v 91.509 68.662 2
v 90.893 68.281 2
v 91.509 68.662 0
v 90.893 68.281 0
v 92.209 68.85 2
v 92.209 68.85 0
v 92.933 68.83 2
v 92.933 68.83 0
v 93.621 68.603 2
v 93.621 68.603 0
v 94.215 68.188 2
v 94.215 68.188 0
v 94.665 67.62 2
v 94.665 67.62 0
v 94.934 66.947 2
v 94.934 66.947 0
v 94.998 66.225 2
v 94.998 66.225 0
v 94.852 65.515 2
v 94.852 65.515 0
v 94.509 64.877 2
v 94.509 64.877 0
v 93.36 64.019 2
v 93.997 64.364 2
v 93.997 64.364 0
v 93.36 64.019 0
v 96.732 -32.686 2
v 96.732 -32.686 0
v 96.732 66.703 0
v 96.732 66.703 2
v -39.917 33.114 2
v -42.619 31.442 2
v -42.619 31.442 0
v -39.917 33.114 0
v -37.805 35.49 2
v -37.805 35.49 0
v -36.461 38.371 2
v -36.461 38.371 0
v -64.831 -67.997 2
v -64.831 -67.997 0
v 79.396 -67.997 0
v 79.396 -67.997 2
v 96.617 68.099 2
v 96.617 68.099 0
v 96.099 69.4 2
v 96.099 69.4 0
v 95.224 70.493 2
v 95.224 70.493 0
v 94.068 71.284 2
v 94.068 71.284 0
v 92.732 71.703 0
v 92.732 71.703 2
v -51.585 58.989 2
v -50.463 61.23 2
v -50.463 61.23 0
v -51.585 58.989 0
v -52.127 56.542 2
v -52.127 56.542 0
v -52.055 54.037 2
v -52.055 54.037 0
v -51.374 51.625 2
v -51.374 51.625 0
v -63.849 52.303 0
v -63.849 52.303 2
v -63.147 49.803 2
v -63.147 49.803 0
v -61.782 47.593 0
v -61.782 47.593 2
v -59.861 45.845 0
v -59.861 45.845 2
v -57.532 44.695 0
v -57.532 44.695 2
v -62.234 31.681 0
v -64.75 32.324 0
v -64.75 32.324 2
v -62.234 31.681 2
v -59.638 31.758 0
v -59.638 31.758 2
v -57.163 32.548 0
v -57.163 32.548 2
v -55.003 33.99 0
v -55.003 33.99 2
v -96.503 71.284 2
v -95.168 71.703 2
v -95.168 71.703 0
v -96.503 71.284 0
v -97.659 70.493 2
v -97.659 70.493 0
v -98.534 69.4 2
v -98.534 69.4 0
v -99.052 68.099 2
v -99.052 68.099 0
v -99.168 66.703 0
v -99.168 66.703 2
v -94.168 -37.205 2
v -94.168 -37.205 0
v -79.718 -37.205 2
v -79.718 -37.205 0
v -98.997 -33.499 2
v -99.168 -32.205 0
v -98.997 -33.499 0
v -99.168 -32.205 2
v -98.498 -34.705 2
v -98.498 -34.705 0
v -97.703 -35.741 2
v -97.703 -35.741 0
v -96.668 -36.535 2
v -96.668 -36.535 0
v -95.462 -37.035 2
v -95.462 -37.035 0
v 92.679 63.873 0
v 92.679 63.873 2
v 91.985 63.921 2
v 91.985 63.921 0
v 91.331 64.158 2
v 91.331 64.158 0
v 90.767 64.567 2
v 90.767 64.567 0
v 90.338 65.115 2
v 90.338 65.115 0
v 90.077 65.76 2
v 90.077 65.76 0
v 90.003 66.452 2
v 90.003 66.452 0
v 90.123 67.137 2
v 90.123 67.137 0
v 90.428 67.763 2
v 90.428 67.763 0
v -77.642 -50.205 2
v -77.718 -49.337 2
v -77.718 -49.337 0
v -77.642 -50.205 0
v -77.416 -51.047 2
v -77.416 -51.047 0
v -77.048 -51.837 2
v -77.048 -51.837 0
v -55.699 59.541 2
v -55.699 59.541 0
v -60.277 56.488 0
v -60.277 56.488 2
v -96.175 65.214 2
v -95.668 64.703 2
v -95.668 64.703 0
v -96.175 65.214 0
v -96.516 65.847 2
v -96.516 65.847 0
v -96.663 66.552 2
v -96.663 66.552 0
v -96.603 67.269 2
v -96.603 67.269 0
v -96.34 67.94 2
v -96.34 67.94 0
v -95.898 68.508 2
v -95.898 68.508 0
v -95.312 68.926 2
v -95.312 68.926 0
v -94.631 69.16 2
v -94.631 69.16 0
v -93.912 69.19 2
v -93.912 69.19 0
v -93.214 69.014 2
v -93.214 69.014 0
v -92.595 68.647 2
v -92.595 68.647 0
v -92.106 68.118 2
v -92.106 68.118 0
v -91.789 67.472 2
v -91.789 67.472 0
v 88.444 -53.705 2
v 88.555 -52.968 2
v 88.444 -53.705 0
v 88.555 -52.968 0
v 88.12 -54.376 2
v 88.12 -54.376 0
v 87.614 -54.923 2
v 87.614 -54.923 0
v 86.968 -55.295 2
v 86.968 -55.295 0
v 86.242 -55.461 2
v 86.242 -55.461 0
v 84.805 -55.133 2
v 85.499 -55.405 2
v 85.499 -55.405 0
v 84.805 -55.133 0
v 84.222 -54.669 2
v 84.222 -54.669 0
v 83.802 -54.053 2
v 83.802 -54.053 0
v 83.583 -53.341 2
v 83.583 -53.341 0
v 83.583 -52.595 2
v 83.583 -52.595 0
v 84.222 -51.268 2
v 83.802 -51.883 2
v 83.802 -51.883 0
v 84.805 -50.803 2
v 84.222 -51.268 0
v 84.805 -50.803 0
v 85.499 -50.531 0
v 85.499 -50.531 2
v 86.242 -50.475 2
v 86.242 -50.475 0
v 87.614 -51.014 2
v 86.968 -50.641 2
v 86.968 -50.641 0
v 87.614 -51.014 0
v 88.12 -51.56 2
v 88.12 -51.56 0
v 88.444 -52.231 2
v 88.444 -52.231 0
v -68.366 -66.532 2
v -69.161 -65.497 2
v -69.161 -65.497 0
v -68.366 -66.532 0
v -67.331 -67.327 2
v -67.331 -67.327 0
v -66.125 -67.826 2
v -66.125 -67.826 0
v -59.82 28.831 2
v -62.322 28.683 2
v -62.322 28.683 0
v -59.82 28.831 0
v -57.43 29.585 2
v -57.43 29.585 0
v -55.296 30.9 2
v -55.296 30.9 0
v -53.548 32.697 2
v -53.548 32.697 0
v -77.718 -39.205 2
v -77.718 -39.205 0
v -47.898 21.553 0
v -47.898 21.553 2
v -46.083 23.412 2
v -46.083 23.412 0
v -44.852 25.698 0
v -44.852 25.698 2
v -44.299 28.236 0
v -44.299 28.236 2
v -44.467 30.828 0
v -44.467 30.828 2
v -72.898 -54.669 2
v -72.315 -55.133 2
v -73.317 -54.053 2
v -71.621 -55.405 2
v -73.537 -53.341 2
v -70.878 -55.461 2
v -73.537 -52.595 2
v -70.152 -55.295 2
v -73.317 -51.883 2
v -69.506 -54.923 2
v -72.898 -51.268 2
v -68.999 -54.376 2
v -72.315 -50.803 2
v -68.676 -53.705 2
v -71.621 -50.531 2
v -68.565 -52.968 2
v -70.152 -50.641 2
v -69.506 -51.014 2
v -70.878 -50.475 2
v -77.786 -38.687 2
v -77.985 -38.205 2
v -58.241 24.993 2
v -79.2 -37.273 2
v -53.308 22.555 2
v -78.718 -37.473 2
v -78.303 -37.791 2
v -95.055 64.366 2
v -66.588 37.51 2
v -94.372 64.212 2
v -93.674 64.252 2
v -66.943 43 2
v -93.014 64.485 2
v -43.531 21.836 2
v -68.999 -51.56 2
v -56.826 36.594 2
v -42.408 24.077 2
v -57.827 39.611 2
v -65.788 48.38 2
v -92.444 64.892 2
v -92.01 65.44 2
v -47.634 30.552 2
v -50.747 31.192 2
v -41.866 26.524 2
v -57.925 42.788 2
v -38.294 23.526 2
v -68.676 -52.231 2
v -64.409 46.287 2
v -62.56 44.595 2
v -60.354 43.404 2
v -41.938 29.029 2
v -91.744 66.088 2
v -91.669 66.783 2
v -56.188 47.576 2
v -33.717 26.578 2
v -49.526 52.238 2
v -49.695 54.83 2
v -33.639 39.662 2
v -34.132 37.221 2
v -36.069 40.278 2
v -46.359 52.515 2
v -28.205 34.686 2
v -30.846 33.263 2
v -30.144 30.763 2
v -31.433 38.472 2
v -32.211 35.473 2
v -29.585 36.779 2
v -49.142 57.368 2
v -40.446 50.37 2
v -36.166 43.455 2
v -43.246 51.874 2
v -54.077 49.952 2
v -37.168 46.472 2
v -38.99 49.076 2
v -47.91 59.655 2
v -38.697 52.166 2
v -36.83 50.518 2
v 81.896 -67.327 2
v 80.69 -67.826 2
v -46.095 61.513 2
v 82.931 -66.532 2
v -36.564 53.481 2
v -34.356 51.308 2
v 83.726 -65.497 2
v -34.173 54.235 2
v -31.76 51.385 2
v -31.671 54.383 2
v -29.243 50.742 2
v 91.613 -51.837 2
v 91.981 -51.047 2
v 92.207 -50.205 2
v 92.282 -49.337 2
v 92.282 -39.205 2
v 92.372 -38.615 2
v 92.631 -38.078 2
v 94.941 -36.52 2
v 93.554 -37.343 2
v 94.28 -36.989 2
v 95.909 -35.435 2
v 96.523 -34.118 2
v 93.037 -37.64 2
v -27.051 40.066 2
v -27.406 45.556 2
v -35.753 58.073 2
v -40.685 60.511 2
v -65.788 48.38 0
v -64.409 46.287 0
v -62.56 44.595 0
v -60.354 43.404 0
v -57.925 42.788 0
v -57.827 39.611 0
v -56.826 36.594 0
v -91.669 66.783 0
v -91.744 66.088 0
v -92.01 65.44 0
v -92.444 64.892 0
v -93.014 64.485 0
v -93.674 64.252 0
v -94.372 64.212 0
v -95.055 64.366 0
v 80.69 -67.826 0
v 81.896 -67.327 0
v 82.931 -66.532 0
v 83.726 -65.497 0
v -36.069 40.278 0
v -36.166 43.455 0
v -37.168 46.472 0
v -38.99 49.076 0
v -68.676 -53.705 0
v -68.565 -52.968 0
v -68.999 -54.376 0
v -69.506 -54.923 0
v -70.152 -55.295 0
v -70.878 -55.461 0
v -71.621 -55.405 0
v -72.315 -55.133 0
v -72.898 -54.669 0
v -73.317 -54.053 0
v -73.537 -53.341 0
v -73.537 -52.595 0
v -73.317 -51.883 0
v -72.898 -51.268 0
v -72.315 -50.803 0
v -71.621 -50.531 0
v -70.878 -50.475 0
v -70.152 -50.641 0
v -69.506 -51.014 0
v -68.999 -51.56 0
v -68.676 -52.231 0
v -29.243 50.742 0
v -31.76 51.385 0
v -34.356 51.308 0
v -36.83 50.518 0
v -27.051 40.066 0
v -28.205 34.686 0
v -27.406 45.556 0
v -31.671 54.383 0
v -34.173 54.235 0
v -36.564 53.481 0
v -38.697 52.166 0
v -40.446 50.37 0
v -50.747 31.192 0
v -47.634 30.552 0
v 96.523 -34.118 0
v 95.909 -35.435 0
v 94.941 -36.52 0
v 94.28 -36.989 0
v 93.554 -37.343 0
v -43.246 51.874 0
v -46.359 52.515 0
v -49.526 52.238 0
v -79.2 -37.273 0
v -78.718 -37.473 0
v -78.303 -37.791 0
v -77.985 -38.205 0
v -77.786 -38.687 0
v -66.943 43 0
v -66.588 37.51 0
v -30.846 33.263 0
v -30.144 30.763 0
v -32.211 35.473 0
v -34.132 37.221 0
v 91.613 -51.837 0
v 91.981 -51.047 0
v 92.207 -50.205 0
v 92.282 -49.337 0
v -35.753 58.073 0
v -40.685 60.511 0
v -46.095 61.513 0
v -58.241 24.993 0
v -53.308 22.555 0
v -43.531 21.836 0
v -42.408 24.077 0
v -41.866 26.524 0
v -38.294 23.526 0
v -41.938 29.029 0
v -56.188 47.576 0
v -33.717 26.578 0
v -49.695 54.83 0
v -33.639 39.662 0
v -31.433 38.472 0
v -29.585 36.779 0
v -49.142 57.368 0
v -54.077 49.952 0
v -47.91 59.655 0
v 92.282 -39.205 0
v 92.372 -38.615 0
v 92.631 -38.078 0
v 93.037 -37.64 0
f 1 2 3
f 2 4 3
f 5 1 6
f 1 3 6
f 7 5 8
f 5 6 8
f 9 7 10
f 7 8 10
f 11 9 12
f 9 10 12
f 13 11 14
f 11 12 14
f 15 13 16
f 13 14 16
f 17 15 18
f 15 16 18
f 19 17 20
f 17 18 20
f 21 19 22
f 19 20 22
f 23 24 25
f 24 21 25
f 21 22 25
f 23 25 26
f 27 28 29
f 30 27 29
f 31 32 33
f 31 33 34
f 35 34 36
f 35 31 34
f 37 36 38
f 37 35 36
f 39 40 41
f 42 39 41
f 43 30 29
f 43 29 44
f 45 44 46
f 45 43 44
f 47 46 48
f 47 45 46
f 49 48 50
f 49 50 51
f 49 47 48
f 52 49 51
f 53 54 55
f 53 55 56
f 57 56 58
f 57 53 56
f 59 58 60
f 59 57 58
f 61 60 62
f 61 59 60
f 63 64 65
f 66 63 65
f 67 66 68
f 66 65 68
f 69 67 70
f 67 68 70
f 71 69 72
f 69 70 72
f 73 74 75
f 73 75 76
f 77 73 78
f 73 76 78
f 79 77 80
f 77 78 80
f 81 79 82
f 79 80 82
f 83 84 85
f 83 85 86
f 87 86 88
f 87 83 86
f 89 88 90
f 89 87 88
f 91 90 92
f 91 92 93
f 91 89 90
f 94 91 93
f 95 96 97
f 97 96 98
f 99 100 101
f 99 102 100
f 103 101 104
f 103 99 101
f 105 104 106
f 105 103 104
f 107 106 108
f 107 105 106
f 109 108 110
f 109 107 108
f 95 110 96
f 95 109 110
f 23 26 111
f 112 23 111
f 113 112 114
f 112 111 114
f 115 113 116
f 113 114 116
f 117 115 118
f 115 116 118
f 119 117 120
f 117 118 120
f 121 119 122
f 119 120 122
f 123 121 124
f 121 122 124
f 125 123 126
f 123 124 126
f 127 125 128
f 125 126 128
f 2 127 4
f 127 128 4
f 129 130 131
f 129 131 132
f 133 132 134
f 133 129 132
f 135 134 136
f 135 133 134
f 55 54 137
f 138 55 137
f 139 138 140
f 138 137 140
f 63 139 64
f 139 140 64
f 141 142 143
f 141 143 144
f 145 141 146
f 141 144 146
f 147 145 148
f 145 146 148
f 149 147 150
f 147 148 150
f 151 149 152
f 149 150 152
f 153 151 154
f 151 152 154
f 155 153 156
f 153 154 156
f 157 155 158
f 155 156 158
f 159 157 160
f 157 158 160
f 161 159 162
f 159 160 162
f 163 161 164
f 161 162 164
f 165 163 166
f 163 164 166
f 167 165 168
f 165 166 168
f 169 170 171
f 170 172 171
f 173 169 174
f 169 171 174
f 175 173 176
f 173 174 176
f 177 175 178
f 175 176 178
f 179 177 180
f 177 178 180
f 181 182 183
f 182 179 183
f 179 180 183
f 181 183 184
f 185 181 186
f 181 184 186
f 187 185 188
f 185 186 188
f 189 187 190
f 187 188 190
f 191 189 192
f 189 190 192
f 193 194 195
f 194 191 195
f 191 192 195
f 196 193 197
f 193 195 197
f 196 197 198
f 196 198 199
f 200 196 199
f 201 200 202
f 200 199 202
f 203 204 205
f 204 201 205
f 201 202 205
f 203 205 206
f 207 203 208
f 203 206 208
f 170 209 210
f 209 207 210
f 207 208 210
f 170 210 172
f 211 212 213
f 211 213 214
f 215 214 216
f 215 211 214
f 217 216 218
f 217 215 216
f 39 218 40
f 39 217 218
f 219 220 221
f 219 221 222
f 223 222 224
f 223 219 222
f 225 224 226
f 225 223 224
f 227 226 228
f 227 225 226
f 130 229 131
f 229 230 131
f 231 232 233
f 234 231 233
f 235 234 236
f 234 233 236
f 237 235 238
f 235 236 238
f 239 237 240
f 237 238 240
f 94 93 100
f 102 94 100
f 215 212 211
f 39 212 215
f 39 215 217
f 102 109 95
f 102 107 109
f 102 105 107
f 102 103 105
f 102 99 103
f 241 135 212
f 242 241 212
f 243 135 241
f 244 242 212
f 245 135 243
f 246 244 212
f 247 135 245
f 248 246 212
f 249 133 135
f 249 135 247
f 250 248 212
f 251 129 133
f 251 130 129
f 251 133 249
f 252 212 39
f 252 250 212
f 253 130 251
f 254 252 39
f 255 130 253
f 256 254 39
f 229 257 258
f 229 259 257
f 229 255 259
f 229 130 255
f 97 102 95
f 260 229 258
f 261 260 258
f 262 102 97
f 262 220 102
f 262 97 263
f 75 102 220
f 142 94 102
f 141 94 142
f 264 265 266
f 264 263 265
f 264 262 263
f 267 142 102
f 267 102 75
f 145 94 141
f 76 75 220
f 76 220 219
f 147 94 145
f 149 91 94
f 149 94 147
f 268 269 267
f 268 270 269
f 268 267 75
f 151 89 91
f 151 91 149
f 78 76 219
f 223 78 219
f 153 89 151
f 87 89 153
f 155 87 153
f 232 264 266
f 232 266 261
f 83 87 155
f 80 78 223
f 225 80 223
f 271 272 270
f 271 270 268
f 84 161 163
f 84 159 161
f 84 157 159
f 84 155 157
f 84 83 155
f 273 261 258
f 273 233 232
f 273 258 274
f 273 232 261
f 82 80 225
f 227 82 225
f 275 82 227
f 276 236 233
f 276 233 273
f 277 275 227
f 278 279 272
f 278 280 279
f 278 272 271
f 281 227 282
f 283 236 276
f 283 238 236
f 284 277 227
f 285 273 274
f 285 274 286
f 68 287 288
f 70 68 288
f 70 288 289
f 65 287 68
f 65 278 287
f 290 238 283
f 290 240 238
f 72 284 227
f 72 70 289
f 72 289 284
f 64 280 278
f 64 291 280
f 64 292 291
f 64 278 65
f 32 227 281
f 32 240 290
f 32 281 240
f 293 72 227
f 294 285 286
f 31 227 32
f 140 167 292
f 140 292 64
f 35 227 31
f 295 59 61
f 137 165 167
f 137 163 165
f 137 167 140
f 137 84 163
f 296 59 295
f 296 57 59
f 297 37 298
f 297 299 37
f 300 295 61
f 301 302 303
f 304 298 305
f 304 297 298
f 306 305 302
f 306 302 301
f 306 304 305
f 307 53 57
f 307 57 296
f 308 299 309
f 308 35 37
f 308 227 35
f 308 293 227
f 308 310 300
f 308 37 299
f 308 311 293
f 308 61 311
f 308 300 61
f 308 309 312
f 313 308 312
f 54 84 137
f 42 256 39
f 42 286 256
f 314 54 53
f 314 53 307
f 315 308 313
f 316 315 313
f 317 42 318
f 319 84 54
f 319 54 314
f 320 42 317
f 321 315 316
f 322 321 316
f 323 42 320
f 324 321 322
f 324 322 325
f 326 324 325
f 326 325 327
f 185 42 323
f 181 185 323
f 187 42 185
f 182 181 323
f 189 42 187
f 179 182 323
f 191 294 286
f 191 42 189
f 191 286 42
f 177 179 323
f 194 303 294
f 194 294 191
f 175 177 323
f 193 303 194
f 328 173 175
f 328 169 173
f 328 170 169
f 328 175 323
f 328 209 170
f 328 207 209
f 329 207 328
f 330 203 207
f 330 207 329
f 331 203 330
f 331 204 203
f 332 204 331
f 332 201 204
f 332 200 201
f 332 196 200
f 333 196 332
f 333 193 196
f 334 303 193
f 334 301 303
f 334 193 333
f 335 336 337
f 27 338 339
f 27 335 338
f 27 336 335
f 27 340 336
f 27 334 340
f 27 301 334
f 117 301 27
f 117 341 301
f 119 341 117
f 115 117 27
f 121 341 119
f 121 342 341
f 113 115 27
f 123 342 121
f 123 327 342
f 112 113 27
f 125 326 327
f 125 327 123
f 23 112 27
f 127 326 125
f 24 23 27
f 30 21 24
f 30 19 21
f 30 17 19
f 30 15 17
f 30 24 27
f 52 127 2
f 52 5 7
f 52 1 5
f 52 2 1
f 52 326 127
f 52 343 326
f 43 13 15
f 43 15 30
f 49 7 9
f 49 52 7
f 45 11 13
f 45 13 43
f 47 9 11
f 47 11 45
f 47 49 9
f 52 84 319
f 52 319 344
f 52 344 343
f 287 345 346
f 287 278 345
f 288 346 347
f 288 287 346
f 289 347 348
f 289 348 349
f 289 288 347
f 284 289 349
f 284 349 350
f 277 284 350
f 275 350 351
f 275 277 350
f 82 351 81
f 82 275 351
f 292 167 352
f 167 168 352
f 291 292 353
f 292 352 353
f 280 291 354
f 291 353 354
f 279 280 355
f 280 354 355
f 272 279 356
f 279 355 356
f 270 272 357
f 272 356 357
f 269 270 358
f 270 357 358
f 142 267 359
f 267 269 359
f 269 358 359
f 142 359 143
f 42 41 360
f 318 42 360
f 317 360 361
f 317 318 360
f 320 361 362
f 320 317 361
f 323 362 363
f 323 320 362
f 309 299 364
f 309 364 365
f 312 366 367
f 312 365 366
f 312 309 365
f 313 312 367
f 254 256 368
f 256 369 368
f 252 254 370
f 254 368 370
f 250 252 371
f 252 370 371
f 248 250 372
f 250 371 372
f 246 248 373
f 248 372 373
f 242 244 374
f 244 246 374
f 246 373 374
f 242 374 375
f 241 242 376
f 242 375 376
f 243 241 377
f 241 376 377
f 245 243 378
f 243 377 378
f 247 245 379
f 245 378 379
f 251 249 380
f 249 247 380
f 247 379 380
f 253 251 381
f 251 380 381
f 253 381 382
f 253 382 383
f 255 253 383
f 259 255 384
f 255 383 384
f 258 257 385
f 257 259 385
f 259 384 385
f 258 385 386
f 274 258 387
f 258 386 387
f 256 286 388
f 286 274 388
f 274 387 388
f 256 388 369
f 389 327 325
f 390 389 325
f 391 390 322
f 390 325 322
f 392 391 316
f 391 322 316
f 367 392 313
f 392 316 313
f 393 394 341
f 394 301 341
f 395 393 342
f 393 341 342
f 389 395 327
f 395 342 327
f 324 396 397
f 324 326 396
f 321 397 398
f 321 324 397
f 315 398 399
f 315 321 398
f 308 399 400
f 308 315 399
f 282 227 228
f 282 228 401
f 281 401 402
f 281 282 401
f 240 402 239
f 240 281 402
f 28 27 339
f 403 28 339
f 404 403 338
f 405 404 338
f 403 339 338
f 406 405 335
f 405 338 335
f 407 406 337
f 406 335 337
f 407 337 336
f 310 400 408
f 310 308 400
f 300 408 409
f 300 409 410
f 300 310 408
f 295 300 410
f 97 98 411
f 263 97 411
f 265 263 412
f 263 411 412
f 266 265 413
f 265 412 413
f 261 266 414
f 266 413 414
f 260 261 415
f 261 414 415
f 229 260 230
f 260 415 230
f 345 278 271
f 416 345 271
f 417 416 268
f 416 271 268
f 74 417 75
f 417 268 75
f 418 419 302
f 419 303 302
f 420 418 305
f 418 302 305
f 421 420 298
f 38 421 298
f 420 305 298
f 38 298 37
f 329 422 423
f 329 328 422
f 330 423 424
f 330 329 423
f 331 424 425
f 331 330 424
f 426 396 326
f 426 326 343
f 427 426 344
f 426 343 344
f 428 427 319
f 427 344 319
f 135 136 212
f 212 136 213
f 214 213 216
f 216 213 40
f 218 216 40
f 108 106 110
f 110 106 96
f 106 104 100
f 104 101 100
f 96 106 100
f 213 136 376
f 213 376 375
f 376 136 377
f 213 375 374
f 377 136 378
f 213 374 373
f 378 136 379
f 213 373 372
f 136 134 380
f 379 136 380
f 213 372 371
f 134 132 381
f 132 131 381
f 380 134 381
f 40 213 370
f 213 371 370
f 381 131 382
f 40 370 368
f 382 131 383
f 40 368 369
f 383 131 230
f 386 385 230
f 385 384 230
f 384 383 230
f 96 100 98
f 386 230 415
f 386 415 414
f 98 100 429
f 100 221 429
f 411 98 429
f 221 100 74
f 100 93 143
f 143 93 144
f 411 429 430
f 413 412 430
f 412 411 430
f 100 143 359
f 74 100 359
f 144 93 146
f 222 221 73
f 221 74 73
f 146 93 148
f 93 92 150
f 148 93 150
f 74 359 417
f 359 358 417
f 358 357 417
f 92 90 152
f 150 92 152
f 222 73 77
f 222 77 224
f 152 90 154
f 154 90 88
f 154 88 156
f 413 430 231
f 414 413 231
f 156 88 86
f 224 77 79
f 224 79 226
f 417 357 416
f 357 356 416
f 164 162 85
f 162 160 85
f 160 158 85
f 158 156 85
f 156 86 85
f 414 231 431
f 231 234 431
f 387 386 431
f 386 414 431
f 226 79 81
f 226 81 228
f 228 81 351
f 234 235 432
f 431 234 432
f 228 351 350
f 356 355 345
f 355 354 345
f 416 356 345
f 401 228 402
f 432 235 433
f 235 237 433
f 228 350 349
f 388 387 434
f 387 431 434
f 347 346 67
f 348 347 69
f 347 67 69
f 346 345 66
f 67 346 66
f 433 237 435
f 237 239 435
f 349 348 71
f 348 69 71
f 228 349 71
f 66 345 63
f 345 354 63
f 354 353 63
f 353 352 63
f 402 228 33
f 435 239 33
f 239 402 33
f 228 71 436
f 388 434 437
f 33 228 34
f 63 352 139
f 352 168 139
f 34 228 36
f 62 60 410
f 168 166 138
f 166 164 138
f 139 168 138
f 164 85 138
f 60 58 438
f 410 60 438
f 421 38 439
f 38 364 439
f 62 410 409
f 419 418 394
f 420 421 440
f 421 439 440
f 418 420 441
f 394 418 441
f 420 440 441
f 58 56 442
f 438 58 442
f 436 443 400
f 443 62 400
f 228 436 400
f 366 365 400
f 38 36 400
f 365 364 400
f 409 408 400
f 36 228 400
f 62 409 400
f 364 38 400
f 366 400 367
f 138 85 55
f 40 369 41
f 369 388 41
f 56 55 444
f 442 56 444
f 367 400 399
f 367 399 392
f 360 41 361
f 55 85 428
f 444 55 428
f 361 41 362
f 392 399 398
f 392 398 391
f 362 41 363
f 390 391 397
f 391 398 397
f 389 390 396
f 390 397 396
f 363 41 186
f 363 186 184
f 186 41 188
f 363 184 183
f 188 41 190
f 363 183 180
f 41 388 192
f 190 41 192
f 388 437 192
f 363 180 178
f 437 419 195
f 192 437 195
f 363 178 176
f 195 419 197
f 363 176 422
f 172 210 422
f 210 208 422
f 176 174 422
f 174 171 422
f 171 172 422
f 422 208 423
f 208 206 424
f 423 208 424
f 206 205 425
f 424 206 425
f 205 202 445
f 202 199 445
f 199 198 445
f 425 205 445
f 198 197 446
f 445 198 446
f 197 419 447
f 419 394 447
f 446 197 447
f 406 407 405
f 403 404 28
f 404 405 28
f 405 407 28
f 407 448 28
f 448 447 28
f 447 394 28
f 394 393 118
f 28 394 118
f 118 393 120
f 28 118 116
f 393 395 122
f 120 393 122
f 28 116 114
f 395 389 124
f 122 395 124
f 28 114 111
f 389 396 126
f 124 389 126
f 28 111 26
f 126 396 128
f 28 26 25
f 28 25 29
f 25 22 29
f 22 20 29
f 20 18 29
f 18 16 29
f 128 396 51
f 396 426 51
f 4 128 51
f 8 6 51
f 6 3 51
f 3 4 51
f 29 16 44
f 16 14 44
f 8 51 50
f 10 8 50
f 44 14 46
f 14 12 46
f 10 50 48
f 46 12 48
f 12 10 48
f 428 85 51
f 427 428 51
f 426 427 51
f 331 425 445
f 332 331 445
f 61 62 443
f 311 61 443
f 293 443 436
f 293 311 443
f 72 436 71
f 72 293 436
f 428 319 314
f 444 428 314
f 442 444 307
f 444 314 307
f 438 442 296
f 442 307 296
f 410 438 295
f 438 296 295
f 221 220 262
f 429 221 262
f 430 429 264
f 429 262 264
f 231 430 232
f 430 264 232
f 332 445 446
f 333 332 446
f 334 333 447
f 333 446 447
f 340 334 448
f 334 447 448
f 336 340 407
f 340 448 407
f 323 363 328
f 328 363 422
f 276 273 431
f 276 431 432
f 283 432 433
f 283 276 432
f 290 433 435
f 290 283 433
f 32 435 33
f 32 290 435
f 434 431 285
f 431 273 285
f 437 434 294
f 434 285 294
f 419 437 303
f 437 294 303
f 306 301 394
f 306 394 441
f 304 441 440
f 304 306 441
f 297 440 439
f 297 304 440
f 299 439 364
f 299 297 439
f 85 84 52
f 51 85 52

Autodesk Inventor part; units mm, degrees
ref_plane "YZ Plane" through (0, 0, 0) normal (1, 0, 0) x (0, 1, 0)
ref_plane "XZ Plane" through (0, 0, 0) normal (0, 1, 0) x (-1, 0, 0)
ref_plane "XY Plane" through (0, 0, 0) normal (0, 0, 1) x (1, 0, 0)
sketch "Sketch4" plane through (0, 0, 0) normal (0, 0, 1) x (1, 0, 0)
  line L0 (92.7325, 70.7032) -> (-95.1675, 70.7032) projected
  arc A0 (-95.1675, 70.7032) -> (-99.1675, 66.7032) centre (-95.1675, 66.7032) ccw projected
  line L1 (-99.1675, 66.7032) -> (-99.1675, -37.2051) projected
  arc A1 (-91.7887, 67.4724) -> (-95.6675, 64.7032) centre (-94.1675, 66.7032) ccw projected
  line L2 (-99.1675, -37.2051) -> (-79.7175, -37.2051) projected
  arc A2 (-77.7175, -39.2051) -> (-79.7175, -37.2051) centre (-79.7175, -39.2051) ccw projected
  line L3 (-77.7175, -39.2051) -> (-77.7175, -50.6763) projected
  line L4 (-77.7175, -50.6763) -> (-67.7175, -67.9968) projected
  line L5 (-67.7175, -67.9968) -> (82.2825, -67.9968) projected
  circle A3 centre (-71.0649, -52.9681) radius 2.5 projected
  line L6 (82.2825, -67.9968) -> (92.2825, -50.6763) projected
  circle A4 centre (86.0549, -52.9681) radius 2.5 projected
  line L7 (92.2825, -50.6763) -> (92.2825, -39.2051) projected
  arc A5 (94.2825, -37.2051) -> (92.2825, -39.2051) centre (94.2825, -39.2051) ccw projected
  line L8 (94.2825, -37.2051) -> (96.7325, -37.2051) projected
  line L9 (96.7325, -37.2051) -> (96.7325, 66.7032) projected
  arc A6 (96.7325, 66.7032) -> (92.7325, 70.7032) centre (92.7325, 66.7032) ccw projected
  arc A7 (93.3598, 64.019) -> (90.8929, 68.2807) centre (92.5018, 66.3672) ccw projected
  arc A8 (90.8929, 68.2807) -> (93.3598, 64.019) centre (92.5018, 66.3672) ccw
  arc A9 (-95.6675, 64.7032) -> (-91.7887, 67.4724) centre (-94.1675, 66.7032) ccw
  point P0 (0, 0)
extrude "Extrusion4" add sketch "Sketch4" along normal blind 2
fillet "Fillet1" radius 5 6 edges at (-99.1675, -37.2051, 1) (-77.7175, -50.6763, 1) (-67.7175, -67.9968, 1) (82.2825, -67.9968, 1) (92.2825, -50.6763, 1) (96.7325, -37.2051, 1)
sketch "Sketch5" plane through (0, 0, 2) normal (0, 0, 1) x (1, 0, 0)
  circle A0 centre (-46.9967, 41.5331) radius 20
  circle A1 centre (-46.9967, 41.5331) radius 11
  point P0 (0, 0)
  dimension "d12" = 40
  dimension "d13" = 22
extrude "Extrusion5" cut sketch "Sketch5" against normal blind 10
sketch "Sketch6" plane through (0, 0, 2) normal (0, 0, 1) x (1, 0, 0)
  arc A0 (-46.4486, 64.74) -> (-47.34, 46.911) centre (-41.9812, 55.5798) ccw
  arc A1 (-38.695, 63.3) -> (-44.2546, 45.6452) centre (-40.3973, 54.1333) ccw
  line L0 (-47.34, 46.911) -> (-44.2546, 45.6452)
  line L1 (-46.4486, 64.74) -> (-38.695, 63.3)
  point P0 (0, 0)
extrude "Extrusion6" add sketch "Sketch6" against normal up to surface (2 mm away)
pattern_circular "Circular Pattern1" count 6 over 360 about axis through (-46.9967, 41.5331, 2) along (0, 0, -1) of "Extrusion6"
sketch "Sketch7" plane through (0, 0, 2) normal (0, 0, 1) x (1, 0, 0)
  line L0 (-95.1675, 71.7032) -> (92.7325, 71.7032) projected
  line L1 (92.7325, 70.7032) -> (-95.1675, 70.7032) projected
  arc A0 (-95.1675, 70.7032) -> (-99.1675, 66.7032) centre (-95.1675, 66.7032) ccw projected
  arc A1 (-95.1675, 71.7032) -> (-99.1675, 66.7032) centre (-94.4287, 67.0121) ccw projected
  arc A2 (96.7325, 66.7032) -> (92.7325, 70.7032) centre (92.7325, 66.7032) ccw projected
  arc A3 (96.7325, 66.7032) -> (92.7325, 71.7032) centre (91.9937, 67.0121) ccw projected
  point P0 (0, 0)
extrude "Extrusion7" add sketch "Sketch7" against normal up to surface (2 mm away)
properties part number "Back Plate"
